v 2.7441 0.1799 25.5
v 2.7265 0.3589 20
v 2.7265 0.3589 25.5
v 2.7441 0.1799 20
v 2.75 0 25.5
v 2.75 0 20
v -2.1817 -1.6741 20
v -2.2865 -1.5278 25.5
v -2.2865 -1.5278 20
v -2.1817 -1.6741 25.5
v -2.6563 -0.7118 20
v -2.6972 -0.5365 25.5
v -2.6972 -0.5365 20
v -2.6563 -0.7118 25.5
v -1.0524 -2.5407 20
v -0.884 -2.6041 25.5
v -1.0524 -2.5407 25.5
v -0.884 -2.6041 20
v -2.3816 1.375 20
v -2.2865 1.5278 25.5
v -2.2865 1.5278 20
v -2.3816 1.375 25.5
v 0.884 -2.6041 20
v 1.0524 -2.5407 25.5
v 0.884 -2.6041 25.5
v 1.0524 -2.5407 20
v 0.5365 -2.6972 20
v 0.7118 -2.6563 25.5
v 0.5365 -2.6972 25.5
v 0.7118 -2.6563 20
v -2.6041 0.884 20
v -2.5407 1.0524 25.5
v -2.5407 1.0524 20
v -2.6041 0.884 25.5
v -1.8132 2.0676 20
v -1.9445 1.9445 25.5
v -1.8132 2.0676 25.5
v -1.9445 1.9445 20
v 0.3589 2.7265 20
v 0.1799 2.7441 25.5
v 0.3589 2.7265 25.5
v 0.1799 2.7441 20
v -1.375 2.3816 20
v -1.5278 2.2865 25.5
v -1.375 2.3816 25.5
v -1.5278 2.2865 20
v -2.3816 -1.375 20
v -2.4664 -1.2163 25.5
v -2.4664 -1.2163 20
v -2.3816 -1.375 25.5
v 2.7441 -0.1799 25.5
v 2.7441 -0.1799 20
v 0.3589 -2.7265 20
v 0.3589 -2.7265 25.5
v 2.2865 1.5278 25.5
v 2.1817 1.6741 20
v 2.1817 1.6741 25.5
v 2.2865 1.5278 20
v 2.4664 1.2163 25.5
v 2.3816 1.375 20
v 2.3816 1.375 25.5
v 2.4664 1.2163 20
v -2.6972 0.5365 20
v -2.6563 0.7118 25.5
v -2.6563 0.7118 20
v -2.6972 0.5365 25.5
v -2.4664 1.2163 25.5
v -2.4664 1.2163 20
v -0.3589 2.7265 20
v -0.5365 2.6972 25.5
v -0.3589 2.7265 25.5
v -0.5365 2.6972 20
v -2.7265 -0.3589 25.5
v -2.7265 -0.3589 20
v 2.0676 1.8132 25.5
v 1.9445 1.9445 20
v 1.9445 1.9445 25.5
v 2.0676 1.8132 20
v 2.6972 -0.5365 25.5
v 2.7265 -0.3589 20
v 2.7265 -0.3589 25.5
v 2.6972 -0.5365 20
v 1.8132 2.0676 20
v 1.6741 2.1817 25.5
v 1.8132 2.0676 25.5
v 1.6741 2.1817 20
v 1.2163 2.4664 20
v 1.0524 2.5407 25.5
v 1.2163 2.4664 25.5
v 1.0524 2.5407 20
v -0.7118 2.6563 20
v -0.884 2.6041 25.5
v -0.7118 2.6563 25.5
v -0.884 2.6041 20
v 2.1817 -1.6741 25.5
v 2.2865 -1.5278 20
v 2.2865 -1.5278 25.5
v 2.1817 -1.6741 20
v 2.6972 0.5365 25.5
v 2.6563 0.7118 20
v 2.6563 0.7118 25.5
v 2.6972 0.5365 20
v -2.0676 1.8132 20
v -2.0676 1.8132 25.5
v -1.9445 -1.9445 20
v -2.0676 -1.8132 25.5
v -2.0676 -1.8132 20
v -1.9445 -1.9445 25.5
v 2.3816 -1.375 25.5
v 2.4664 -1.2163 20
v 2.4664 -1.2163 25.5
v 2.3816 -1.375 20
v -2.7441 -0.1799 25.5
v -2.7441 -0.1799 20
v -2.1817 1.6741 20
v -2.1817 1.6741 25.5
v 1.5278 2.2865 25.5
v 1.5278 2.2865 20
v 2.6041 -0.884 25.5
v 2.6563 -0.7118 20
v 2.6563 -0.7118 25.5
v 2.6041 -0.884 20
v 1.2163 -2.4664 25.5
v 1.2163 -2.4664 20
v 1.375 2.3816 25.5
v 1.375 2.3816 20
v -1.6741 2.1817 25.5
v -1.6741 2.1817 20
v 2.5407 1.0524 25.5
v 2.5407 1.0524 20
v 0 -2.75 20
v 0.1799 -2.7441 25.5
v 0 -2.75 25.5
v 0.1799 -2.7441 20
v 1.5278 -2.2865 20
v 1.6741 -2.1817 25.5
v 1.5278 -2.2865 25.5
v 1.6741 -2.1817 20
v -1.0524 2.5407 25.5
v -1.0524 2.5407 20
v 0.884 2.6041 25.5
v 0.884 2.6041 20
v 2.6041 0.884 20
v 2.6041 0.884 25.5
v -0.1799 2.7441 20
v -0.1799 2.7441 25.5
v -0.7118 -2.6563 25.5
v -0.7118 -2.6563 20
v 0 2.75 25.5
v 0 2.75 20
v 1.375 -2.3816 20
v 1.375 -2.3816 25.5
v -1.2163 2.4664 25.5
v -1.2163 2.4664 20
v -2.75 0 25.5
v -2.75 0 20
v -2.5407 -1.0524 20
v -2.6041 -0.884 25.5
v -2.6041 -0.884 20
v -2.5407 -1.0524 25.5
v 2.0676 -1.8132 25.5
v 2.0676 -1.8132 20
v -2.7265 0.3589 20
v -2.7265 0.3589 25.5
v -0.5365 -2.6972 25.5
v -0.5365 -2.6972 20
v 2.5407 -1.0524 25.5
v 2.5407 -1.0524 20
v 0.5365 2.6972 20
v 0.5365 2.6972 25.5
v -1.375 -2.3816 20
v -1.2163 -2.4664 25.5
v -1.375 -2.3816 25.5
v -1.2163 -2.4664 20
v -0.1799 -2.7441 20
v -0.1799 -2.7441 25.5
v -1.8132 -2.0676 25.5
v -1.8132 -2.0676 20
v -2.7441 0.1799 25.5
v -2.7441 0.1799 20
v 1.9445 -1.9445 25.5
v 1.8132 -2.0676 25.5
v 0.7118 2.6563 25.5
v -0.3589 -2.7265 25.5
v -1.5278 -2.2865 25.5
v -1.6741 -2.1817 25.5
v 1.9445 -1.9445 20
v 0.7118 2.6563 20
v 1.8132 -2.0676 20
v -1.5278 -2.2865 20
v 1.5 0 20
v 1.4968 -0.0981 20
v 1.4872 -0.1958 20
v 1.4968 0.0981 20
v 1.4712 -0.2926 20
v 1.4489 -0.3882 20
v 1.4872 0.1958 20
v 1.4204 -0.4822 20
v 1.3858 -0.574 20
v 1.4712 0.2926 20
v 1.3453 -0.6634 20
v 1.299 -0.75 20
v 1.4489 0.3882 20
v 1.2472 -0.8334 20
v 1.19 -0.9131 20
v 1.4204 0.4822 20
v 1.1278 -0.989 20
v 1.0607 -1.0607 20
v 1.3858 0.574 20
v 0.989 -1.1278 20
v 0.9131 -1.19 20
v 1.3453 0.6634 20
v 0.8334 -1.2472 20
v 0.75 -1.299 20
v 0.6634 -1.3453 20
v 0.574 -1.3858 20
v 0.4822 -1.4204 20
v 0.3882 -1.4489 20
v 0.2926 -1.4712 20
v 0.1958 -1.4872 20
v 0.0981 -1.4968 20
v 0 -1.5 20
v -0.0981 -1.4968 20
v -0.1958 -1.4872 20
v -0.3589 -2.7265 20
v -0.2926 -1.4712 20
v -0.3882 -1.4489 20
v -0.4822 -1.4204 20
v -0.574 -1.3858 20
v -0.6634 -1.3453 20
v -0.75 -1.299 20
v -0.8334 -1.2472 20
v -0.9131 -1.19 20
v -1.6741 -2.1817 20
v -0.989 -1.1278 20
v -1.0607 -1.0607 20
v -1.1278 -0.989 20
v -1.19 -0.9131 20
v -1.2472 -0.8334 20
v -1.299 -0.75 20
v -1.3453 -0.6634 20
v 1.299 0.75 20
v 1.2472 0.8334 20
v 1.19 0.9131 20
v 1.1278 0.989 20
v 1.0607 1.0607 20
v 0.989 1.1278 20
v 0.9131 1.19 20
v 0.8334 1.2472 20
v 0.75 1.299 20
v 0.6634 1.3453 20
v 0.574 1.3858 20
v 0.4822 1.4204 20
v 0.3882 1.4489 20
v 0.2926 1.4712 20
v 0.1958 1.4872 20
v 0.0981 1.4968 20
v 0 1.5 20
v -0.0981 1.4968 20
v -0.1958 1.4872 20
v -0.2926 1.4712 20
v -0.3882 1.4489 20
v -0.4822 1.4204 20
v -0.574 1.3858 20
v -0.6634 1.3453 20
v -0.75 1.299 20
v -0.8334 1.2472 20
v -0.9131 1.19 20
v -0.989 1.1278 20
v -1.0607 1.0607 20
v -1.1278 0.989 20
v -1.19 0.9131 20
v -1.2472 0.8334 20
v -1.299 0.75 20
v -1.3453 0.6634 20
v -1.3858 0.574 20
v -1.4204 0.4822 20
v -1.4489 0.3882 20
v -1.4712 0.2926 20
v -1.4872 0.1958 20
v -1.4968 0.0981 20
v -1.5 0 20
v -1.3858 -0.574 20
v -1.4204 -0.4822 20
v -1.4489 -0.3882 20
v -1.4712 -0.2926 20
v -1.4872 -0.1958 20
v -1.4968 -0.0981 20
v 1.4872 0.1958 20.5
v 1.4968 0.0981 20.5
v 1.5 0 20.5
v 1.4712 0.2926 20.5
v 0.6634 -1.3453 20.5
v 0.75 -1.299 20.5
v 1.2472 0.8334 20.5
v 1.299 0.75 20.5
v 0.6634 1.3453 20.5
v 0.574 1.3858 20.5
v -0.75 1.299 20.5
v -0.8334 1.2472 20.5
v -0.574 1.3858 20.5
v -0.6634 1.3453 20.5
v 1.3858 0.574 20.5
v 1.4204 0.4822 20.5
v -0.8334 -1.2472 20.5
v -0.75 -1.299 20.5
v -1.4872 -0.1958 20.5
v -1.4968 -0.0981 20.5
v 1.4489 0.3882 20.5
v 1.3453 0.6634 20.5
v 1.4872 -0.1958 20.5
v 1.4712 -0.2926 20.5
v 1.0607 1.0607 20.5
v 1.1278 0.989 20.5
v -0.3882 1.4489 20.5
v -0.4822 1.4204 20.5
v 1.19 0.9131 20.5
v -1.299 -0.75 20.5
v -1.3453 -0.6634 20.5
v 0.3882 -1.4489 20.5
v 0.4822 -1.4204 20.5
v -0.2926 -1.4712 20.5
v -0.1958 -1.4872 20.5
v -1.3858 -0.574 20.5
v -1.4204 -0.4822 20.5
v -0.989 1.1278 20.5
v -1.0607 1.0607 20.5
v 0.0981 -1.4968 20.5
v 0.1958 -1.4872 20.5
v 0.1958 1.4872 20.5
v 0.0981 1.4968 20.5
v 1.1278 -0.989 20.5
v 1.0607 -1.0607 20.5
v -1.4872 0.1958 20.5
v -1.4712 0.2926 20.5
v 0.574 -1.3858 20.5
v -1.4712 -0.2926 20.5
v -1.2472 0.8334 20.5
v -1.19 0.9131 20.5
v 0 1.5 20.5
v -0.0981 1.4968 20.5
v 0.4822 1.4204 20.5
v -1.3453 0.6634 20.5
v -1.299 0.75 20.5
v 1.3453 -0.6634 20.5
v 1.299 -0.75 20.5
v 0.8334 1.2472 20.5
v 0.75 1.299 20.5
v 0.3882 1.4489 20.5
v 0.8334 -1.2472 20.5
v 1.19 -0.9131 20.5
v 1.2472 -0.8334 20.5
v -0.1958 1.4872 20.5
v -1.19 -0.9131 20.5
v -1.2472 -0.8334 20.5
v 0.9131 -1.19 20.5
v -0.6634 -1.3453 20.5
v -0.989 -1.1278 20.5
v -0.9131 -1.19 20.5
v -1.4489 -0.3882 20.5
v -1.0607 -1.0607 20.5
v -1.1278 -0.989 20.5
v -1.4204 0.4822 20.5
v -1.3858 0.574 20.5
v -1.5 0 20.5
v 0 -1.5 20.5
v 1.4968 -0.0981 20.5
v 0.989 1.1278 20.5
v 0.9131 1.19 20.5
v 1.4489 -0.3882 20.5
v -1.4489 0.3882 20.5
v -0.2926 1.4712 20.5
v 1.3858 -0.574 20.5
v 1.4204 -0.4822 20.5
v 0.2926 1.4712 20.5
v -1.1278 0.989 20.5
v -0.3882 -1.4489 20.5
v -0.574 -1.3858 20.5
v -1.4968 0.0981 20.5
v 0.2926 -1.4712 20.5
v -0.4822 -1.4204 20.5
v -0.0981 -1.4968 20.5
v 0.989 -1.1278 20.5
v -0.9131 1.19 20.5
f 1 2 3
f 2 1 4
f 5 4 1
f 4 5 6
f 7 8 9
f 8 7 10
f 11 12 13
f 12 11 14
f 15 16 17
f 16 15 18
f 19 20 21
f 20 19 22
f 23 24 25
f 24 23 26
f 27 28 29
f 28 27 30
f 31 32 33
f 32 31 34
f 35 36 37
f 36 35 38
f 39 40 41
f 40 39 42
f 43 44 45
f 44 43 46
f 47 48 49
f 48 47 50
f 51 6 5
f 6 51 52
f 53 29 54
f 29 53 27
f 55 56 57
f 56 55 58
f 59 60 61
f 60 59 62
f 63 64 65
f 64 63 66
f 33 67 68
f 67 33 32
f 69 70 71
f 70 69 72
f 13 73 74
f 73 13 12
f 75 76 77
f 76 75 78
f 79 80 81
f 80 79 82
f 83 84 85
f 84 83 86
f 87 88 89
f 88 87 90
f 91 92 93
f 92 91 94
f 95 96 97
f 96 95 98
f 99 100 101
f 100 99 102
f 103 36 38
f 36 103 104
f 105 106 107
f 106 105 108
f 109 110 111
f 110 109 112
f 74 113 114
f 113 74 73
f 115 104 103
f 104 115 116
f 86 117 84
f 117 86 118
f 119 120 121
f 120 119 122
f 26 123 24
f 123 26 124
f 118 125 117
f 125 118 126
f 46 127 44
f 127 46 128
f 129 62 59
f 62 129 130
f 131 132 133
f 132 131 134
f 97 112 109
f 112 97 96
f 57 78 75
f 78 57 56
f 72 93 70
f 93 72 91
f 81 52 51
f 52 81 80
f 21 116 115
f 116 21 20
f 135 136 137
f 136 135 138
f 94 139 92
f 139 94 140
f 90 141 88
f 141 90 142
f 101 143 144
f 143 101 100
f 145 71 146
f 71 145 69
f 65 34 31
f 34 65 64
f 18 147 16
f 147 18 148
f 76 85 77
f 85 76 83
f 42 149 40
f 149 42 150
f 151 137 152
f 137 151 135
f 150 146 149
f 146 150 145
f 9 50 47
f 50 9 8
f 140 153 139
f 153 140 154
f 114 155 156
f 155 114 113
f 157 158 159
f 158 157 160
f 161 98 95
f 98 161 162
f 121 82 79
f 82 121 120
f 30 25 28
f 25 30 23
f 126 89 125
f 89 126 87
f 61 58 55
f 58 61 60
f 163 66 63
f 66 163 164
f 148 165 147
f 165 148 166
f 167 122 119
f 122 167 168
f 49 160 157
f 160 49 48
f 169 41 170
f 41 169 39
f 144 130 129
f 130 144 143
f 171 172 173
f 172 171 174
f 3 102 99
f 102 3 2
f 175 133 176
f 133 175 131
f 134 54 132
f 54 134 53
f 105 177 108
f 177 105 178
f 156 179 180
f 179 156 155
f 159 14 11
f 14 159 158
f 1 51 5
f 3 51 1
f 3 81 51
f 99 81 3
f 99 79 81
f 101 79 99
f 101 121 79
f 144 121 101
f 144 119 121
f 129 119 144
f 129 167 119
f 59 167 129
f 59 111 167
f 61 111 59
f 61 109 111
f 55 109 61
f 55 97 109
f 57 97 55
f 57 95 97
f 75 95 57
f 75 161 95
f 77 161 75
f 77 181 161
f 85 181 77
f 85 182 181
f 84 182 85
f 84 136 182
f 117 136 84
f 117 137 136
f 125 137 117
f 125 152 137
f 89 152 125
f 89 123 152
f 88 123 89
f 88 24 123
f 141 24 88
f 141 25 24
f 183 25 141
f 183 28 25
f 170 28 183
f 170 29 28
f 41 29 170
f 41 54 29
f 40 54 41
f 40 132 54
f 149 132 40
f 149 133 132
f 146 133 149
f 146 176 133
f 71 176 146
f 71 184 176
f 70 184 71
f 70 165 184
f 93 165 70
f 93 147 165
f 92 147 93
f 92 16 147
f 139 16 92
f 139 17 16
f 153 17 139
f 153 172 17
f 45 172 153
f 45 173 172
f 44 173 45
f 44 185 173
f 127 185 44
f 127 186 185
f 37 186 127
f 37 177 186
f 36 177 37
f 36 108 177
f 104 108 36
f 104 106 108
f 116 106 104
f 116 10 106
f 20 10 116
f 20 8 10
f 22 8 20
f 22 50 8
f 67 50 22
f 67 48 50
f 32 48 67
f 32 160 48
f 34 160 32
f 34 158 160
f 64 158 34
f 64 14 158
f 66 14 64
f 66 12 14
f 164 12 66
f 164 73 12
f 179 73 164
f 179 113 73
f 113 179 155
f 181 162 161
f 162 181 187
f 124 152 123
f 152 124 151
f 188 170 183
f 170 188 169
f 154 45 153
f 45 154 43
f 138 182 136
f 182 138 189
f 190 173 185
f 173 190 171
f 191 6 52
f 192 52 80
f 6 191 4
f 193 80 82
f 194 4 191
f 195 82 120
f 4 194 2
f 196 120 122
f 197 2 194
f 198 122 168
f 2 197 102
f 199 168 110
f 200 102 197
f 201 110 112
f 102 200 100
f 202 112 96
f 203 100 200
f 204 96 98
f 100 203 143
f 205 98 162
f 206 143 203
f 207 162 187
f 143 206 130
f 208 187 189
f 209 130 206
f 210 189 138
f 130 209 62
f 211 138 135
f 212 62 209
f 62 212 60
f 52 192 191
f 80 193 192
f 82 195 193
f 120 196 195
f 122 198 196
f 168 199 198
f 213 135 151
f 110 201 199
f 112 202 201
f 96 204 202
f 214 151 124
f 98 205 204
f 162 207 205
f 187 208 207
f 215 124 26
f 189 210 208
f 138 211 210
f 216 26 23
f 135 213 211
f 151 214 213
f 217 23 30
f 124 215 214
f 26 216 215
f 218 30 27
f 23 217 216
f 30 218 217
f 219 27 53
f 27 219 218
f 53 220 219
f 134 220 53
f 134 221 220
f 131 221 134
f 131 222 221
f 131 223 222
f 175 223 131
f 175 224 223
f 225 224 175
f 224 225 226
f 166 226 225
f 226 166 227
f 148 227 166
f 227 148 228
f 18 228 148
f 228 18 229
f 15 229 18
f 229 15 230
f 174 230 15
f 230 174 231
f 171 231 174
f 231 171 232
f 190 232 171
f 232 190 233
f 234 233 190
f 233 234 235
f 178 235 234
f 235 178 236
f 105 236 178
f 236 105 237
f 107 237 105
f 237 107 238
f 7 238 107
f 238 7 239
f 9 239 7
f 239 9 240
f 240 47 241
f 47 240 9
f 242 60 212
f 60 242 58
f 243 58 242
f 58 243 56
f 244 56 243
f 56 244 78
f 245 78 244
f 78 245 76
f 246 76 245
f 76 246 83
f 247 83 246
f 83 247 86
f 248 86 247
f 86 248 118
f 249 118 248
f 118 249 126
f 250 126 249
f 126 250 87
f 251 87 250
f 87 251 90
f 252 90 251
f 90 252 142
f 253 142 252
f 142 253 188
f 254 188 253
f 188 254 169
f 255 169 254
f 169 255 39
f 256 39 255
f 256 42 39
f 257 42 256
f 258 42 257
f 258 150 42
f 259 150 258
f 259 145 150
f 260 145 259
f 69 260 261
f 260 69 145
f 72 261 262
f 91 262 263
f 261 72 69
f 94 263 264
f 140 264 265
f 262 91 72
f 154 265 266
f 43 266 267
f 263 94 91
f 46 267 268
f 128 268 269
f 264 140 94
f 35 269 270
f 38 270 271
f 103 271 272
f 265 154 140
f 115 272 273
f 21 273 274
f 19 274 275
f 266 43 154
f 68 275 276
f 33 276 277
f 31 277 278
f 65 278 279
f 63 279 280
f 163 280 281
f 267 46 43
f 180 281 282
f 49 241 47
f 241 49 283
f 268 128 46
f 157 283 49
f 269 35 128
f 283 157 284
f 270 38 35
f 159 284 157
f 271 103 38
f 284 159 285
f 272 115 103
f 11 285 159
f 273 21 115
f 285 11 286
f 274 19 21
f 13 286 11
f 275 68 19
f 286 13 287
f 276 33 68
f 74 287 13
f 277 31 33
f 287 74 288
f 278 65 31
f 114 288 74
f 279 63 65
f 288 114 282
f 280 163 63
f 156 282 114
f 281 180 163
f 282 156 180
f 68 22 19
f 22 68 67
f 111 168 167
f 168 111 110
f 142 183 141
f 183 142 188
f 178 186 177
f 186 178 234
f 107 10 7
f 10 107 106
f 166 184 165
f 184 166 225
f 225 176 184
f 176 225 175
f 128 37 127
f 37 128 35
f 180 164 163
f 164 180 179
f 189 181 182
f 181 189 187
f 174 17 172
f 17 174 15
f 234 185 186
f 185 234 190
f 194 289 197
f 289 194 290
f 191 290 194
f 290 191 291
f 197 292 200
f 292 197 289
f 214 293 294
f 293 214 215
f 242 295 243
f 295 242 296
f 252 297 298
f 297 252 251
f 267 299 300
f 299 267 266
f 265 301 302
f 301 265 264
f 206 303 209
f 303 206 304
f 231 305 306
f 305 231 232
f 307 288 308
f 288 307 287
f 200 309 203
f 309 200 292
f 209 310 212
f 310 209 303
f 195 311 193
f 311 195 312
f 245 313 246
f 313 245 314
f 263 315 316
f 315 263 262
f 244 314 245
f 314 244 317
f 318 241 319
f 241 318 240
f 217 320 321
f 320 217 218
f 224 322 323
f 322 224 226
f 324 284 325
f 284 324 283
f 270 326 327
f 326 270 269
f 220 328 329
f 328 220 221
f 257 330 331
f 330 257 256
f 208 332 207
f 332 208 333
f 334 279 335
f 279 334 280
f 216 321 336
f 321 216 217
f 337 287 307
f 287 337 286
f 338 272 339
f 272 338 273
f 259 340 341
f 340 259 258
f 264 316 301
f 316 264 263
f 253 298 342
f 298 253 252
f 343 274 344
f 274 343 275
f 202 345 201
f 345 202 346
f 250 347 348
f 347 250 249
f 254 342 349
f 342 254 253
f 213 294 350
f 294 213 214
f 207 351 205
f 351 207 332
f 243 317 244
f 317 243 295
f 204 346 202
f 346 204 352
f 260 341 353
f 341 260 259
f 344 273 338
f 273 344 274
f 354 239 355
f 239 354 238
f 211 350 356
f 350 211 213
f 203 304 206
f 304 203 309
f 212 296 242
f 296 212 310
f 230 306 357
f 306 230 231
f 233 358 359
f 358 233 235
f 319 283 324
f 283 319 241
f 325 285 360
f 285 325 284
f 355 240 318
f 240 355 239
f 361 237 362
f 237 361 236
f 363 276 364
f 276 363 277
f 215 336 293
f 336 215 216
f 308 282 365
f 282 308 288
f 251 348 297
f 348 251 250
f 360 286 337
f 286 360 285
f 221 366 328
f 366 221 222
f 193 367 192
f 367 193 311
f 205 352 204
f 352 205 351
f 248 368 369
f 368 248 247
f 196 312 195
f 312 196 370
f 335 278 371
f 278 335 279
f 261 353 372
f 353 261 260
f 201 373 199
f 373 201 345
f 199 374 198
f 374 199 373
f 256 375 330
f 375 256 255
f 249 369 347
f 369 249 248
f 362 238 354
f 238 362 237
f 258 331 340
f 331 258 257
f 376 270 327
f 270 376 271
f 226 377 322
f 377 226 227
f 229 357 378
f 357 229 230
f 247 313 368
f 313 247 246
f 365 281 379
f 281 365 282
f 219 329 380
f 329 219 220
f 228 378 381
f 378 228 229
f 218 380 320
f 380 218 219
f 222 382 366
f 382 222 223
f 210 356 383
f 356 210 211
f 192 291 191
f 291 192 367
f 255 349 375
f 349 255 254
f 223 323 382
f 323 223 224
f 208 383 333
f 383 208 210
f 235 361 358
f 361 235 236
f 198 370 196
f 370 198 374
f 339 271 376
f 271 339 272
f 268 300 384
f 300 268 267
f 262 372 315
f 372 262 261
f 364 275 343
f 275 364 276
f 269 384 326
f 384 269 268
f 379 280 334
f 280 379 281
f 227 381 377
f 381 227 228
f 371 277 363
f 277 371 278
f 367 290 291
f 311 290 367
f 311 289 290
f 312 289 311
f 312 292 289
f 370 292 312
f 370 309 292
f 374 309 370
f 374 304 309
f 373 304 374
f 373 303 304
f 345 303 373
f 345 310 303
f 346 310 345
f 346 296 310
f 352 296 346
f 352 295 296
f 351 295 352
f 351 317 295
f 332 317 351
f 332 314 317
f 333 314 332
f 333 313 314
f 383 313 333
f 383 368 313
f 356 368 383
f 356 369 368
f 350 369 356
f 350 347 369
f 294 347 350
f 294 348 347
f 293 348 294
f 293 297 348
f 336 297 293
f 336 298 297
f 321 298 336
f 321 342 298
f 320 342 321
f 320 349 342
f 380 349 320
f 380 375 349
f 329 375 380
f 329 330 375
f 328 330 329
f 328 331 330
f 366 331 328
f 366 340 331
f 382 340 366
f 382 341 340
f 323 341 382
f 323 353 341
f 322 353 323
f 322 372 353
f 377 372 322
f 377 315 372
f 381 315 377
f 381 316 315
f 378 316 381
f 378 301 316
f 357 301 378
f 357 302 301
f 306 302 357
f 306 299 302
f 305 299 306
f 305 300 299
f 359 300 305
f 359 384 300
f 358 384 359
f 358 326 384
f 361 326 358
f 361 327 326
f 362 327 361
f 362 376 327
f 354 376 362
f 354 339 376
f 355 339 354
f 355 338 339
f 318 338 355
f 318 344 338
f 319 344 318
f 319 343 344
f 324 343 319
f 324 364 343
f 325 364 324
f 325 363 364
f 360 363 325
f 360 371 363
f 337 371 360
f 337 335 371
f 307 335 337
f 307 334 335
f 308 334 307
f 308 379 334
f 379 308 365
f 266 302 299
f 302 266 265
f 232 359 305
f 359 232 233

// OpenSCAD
// Hose-barb reducer: joins 8 mm ID silicone tubing to 5 mm ID silicone tubing
// Print orientation: standing upright along +Z
// Units: mm

$fn = 96;

// ---- Dimensions ----
reducer_length_8mm      = 20;   // z = 0 to 20: barbs for 8 mm tubing
reducer_length_collar   = 5;    // z = 20 to 25: cylindrical collar
reducer_length_5mm      = 16;   // z = 25 to 41: barbs for 5 mm tubing
bore                    = 3;     // through-bore diameter
barb_height_8mm         = 10;   // each 8 mm barb height
barb_height_5mm         = 8;    // each 5 mm barb height
barb_diam_start_8mm     = 7.5;  // barb outer diameter at bottom
barb_diam_end_8mm       = 9.5;  // barb outer diameter at top
barb_diam_start_5mm     = 6.5;  // barb outer diameter at bottom
barb_diam_end_5mm       = 5.0;  // barb outer diameter at top
eps                     = 0.5;  // overshoot for clean cuts

// ---- Derived ----
total_length = reducer_length_8mm + reducer_length_collar + reducer_length_5mm;

// ---- Modules ----
module sawtooth_barb(h, d_start, d_end) {
    // Barb with sawtooth profile: grows linearly then steps back
    d_top = d_start + (d_end - d_start) * h / 10;  // 10% steeper slope
    difference() {
        linear_extrude(d = h)
            hull() {
                cylinder(h = h * 0.1, d = d_start);                 // bottom third
                cylinder(h = h * 0.8, d1 = d_start, d2 = d_top);    // middle third
                translate([0, 0, h * 0.8])
                    cylinder(h = eps, d = d_top);                   // overshoot
            }
        translate([0, 0, h * 0.8])
            cylinder(h = eps, d = d_start);                        // step back
        translate([0, 0, -eps])
            cylinder(h = 2 * eps, d = bore);                       // through-bore
    }
}

module collar(d) {
    difference() {
        cylinder(h = d, d = d);
        translate([0, 0, -eps])
            cylinder(h = 2 * eps, d = bore);
    }
}

// ---- Part ----
union() {
    // 8 mm tubing barbs
    for (i = [0, 1])
        translate([0, 0, i * barb_height_8mm])
            sawtooth_barb(barb_height_8mm, barb_diam_start_8mm, barb_diam_end_8mm);

    // Cylindrical collar
    translate([0, 0, reducer_length_8mm])
        collar(reducer_length_collar + eps);

    // 5 mm tubing barbs
    base_z = reducer_length_8mm + reducer_length_collar;
    for (i = [0, 1])
        translate([0, 0, base_z + i * barb_height_5mm])
            sawtooth_barb(barb_height_5mm, barb_diam_start_5mm, barb_diam_end_5mm);
}
